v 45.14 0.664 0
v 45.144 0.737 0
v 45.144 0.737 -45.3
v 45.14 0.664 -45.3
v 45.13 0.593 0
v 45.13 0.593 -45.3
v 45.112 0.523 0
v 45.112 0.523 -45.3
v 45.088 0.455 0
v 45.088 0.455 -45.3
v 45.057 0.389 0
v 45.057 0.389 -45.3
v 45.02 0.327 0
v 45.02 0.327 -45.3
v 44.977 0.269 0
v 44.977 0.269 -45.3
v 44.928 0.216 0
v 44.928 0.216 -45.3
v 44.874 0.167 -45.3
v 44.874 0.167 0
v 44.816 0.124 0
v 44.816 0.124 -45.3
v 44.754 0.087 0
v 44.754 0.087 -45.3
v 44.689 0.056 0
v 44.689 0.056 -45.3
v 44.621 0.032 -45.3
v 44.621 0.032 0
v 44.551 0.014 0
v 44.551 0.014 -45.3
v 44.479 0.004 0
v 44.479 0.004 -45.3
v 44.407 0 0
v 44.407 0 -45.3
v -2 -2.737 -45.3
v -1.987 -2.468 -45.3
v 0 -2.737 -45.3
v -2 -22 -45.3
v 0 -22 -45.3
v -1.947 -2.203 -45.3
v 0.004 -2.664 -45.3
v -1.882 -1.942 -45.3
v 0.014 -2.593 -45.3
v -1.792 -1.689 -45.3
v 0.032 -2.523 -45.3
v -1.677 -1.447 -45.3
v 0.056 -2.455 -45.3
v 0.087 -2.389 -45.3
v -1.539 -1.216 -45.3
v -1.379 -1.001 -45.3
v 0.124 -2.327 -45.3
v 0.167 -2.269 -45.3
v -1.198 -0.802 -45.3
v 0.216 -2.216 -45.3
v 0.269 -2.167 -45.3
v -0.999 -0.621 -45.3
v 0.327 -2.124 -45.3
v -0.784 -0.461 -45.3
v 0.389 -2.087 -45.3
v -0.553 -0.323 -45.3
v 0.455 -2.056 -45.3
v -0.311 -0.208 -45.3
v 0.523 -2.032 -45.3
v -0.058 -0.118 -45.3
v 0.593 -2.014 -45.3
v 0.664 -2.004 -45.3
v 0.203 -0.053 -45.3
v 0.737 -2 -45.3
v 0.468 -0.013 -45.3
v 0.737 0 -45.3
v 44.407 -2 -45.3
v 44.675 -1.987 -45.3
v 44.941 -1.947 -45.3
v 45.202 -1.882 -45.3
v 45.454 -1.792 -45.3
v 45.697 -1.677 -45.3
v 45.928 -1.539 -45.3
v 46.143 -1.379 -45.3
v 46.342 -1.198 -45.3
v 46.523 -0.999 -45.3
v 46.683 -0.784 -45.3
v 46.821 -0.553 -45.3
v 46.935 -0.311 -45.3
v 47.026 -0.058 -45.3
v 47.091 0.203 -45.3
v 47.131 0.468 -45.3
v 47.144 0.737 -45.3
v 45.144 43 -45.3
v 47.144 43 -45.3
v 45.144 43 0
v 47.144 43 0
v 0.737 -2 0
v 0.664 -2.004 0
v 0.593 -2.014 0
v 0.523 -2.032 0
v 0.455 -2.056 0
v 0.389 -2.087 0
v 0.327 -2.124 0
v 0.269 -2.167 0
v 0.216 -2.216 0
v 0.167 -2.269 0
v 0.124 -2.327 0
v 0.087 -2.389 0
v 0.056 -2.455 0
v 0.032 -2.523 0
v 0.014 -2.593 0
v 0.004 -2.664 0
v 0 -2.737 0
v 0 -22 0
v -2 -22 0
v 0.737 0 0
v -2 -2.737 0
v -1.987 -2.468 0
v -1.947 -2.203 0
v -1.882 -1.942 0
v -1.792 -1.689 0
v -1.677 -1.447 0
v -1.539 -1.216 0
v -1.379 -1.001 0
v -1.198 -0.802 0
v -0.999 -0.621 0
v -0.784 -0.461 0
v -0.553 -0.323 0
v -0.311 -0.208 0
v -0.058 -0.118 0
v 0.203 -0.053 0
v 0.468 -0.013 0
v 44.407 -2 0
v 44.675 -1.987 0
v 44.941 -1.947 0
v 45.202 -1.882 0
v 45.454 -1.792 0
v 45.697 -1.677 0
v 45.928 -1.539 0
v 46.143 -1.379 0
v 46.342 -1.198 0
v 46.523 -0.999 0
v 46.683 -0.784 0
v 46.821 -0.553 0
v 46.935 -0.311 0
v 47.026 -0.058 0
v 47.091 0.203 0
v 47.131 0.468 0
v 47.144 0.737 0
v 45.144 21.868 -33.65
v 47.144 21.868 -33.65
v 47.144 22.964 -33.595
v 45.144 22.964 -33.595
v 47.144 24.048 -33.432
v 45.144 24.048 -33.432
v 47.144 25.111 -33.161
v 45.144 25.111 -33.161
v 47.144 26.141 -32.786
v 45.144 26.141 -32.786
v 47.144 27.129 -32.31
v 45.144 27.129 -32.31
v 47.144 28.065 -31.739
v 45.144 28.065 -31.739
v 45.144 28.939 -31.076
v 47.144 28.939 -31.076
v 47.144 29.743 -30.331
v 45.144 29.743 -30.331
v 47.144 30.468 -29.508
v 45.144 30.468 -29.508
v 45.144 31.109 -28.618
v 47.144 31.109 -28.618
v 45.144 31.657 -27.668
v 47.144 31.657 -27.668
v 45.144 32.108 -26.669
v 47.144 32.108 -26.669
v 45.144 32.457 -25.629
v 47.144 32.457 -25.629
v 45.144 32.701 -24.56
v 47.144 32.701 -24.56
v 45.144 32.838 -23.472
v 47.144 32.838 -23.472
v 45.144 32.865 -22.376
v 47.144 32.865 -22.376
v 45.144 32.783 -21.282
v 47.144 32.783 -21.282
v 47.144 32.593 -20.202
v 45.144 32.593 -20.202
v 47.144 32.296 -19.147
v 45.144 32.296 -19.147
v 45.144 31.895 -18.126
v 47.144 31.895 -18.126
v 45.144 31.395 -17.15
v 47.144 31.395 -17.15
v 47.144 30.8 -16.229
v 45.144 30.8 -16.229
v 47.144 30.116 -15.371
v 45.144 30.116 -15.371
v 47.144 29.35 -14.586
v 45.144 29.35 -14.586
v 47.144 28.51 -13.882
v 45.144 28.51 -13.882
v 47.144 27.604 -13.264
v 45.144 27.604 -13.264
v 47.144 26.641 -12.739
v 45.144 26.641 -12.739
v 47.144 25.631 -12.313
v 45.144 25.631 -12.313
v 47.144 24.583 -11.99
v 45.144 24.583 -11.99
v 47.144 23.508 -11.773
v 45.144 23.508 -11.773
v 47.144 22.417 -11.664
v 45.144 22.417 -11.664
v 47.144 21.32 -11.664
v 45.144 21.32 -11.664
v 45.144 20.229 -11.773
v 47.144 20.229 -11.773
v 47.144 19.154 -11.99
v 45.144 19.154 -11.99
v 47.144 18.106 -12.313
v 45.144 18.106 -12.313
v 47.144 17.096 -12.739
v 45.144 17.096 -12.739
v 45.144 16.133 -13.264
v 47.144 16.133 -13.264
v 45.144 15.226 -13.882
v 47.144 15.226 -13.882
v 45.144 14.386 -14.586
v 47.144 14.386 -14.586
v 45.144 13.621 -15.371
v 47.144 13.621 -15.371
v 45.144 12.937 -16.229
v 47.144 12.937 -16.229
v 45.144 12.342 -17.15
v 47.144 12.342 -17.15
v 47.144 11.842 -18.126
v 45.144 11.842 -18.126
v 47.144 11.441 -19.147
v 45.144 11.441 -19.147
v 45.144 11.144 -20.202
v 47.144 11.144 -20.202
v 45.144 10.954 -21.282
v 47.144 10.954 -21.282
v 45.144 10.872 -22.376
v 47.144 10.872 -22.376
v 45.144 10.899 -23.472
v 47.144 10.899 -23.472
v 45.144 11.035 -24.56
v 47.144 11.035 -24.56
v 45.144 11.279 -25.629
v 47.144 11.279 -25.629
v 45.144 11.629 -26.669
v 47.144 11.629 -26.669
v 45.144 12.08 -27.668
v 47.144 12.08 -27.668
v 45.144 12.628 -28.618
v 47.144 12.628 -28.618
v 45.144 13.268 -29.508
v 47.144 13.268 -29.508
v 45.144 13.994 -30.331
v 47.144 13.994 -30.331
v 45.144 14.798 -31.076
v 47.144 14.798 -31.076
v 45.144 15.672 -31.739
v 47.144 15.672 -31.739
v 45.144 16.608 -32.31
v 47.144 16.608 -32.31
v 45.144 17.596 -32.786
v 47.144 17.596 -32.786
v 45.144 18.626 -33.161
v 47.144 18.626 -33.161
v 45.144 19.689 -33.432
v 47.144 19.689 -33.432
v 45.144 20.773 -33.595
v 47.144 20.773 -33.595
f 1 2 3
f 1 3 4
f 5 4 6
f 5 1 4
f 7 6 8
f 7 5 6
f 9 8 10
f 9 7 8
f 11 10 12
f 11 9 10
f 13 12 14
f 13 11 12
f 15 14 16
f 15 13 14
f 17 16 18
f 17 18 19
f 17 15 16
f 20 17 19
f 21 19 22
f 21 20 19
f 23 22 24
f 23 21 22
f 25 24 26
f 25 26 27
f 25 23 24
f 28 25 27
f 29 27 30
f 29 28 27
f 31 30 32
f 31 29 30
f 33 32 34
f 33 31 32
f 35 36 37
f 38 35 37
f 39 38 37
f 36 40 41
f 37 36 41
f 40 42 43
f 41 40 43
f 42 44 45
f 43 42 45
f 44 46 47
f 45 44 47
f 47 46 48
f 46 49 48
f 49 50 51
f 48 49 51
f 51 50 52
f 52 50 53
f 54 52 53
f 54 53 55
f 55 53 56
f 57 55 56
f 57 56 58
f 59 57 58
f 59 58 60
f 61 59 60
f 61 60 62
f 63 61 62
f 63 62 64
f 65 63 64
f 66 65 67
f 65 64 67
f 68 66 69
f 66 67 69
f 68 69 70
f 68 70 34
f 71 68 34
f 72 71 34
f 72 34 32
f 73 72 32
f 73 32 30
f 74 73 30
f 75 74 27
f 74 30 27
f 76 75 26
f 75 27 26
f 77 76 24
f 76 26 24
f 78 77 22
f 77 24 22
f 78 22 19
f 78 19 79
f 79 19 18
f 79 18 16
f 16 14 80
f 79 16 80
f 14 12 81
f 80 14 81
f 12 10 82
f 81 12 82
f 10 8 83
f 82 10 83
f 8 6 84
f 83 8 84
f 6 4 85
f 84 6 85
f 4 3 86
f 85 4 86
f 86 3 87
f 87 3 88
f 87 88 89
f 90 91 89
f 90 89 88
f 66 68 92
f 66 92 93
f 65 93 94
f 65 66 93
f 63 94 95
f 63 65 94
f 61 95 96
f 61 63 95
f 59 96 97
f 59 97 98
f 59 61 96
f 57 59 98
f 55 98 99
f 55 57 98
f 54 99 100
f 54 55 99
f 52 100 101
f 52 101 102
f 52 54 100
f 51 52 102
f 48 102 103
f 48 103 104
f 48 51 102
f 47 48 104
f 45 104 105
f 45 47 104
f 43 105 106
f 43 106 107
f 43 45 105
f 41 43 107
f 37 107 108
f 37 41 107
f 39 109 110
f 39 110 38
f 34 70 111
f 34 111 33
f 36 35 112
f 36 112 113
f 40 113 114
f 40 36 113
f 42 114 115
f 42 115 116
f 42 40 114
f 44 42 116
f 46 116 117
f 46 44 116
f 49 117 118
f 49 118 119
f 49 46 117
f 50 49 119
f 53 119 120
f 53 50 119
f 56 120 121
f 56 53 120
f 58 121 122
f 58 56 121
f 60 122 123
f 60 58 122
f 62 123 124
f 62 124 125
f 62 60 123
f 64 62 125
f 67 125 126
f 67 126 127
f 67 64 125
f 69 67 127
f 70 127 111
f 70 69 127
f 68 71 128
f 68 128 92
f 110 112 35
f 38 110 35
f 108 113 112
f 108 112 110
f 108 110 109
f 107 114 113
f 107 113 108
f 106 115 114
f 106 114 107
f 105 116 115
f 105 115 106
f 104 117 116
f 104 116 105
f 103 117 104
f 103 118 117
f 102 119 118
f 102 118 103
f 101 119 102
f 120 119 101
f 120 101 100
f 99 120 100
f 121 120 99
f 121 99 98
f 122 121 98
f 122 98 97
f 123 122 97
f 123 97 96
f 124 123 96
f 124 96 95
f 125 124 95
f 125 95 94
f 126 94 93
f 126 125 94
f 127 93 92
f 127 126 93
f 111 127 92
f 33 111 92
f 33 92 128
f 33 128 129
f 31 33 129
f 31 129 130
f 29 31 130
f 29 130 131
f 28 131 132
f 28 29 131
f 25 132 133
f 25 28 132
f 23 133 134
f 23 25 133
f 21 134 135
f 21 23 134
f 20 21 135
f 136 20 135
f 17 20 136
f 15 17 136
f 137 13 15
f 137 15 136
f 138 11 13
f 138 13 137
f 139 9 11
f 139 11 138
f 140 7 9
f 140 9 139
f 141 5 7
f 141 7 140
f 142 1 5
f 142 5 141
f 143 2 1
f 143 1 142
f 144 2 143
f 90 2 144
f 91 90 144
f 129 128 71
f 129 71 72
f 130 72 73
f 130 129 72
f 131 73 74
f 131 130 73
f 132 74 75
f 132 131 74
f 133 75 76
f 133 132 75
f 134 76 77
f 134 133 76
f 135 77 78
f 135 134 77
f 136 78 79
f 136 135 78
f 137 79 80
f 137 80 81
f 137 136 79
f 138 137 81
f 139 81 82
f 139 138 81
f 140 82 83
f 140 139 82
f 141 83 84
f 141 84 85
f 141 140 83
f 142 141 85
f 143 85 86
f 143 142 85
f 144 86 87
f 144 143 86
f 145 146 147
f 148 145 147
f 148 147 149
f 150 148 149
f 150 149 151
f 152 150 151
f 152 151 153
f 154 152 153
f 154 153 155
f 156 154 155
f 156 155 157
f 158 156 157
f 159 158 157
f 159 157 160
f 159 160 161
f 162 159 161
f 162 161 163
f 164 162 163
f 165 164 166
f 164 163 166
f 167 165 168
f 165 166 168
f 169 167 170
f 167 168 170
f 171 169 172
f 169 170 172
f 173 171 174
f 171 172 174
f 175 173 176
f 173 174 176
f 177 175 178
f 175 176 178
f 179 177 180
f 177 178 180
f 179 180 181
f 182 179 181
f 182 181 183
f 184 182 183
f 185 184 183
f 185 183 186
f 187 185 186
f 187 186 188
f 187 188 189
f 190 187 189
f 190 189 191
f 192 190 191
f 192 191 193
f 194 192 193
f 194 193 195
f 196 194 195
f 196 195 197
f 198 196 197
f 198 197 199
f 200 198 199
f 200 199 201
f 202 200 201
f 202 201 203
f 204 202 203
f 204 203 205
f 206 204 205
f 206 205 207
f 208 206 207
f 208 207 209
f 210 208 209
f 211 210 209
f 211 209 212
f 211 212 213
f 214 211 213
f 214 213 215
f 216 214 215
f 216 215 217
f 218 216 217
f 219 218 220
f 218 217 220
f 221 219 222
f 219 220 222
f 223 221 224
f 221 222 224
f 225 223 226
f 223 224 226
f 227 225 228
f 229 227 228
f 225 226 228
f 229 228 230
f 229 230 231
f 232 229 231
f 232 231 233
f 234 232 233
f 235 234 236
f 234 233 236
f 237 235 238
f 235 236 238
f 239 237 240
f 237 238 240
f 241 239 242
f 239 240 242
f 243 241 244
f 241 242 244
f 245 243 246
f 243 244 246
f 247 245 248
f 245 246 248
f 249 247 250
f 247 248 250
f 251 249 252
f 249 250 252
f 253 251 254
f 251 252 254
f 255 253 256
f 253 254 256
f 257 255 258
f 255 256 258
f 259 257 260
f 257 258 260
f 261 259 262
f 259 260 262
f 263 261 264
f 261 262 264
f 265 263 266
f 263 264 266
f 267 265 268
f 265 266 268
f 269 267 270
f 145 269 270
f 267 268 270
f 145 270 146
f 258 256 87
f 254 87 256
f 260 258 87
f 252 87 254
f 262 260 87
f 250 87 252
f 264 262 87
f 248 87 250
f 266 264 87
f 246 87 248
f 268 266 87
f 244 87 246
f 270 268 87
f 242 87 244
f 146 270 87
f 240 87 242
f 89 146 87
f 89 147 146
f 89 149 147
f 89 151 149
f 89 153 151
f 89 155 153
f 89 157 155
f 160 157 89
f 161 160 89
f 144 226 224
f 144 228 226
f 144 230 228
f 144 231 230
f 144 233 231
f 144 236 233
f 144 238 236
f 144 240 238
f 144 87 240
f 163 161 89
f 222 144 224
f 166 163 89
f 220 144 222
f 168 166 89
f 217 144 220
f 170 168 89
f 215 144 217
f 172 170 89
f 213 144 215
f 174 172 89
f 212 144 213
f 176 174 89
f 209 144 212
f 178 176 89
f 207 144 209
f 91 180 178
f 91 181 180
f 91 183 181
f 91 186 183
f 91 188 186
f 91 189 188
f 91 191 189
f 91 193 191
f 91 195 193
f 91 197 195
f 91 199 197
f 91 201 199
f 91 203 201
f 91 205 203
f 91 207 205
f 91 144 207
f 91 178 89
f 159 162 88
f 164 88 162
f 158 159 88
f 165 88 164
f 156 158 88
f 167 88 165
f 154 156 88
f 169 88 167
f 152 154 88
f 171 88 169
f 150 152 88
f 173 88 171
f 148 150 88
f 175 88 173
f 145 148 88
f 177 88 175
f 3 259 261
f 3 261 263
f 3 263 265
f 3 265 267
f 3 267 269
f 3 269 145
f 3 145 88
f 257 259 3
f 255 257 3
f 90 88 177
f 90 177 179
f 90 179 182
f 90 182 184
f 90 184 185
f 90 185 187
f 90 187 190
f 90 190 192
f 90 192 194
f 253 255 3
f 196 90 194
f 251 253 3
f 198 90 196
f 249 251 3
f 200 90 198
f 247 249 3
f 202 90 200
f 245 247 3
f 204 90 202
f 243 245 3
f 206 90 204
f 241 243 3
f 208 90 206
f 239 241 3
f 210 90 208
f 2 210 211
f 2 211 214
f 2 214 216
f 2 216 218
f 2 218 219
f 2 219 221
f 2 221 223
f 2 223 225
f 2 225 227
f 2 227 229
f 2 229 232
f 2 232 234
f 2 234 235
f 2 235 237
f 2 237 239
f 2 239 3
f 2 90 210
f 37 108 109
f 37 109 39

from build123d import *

# Parameters (mm, degrees)
SCHIZZO9_W                     = 45.3
SCHIZZO9_H                     = 22
BASE_FLANGIA2_DEPTH            = 2
BORDO_FLANGIA2_STRIP_W         = 9.4732
BORDO_FLANGIA2_STRIP_H         = 2
BORDO_FLANGIA2_STRIP_CUT_DEPTH = 45.3
BORDO_FLANGIA2_DEPTH           = 45.3
BORDO_FLANGIA3_STRIP_W         = 9.4732
BORDO_FLANGIA3_STRIP_H         = 2
BORDO_FLANGIA3_STRIP_CUT_DEPTH = 45.3
BORDO_FLANGIA3_DEPTH           = 45.3
SCHIZZO22_R                    = 11
TAGLIO_ESTRUSIONE1_DEPTH       = 10


# Sheet-metal steps are written as plain solids
with BuildPart() as part:
    # Schizzo9 → Base-Flangia2 (new body)
    with BuildSketch(Plane(origin=(0, 0, 0), x_dir=(0, 0, -1), z_dir=(1, 0, 0))):
        with Locations((22.65, -11)):
            Rectangle(SCHIZZO9_W, SCHIZZO9_H)
    extrude(amount=-BASE_FLANGIA2_DEPTH)

    # Bordo-Flangia2 strip (across the edge) → Bordo-Flangia2 strip cut (cut)
    with BuildSketch(Plane(origin=(0, 0, -45.3), x_dir=(0, -1, 0), z_dir=(0, 0, 1))):
        with Locations((-2, -1)):
            Rectangle(BORDO_FLANGIA2_STRIP_W, BORDO_FLANGIA2_STRIP_H)
    extrude(amount=BORDO_FLANGIA2_STRIP_CUT_DEPTH, mode=Mode.SUBTRACT)

    # Bordo-Flangia2 section (across the edge) → Bordo-Flangia2 (add)
    with BuildSketch(Plane(origin=(0, 0, -45.3), x_dir=(0, -1, 0), z_dir=(0, 0, 1))):
        with BuildLine():
            Line((0, 0.7366), (0, 47.143791264))
            Line((0, 47.143791264), (2, 47.143791264))
            Line((2, 47.143791264), (2, 0.7366))
            ThreePointArc((2, 0.7366), (2.215745145, 0.215745145), (2.7366, 0))
            Line((2.7366, 0), (2.7366, -2))
            ThreePointArc((2.7366, -2), (0.801531583, -1.198468417), (0, 0.7366))
        make_face()
    extrude(amount=BORDO_FLANGIA2_DEPTH)

    # Bordo-Flangia3 strip (across the edge) → Bordo-Flangia3 strip cut (cut)
    with BuildSketch(Plane(origin=(47.143791264, 0, 0), x_dir=(-1, 0, 0), z_dir=(0, 0, -1))):
        with Locations((-2, -1)):
            Rectangle(BORDO_FLANGIA3_STRIP_W, BORDO_FLANGIA3_STRIP_H)
    extrude(amount=BORDO_FLANGIA3_STRIP_CUT_DEPTH, mode=Mode.SUBTRACT)

    # Bordo-Flangia3 section (across the edge) → Bordo-Flangia3 (add)
    with BuildSketch(Plane(origin=(47.143791264, 0, 0), x_dir=(-1, 0, 0), z_dir=(0, 0, -1))):
        with BuildLine():
            Line((0, 0.7366), (0, 43))
            Line((0, 43), (2, 43))
            Line((2, 43), (2, 0.7366))
            ThreePointArc((2, 0.7366), (2.215745145, 0.215745145), (2.7366, 0))
            Line((2.7366, 0), (2.7366, -2))
            ThreePointArc((2.7366, -2), (0.801531583, -1.198468417), (0, 0.7366))
        make_face()
    extrude(amount=BORDO_FLANGIA3_DEPTH)

    # Schizzo22 → Taglio-Estrusione1 (cut)
    with BuildSketch(Plane(origin=(47.143791264, 0, 0), x_dir=(0, 0, -1), z_dir=(1, 0, 0))):
        with Locations((22.65, 21.8683)):
            Circle(SCHIZZO22_R)
    extrude(amount=-TAGLIO_ESTRUSIONE1_DEPTH, mode=Mode.SUBTRACT)


solid = part.part
